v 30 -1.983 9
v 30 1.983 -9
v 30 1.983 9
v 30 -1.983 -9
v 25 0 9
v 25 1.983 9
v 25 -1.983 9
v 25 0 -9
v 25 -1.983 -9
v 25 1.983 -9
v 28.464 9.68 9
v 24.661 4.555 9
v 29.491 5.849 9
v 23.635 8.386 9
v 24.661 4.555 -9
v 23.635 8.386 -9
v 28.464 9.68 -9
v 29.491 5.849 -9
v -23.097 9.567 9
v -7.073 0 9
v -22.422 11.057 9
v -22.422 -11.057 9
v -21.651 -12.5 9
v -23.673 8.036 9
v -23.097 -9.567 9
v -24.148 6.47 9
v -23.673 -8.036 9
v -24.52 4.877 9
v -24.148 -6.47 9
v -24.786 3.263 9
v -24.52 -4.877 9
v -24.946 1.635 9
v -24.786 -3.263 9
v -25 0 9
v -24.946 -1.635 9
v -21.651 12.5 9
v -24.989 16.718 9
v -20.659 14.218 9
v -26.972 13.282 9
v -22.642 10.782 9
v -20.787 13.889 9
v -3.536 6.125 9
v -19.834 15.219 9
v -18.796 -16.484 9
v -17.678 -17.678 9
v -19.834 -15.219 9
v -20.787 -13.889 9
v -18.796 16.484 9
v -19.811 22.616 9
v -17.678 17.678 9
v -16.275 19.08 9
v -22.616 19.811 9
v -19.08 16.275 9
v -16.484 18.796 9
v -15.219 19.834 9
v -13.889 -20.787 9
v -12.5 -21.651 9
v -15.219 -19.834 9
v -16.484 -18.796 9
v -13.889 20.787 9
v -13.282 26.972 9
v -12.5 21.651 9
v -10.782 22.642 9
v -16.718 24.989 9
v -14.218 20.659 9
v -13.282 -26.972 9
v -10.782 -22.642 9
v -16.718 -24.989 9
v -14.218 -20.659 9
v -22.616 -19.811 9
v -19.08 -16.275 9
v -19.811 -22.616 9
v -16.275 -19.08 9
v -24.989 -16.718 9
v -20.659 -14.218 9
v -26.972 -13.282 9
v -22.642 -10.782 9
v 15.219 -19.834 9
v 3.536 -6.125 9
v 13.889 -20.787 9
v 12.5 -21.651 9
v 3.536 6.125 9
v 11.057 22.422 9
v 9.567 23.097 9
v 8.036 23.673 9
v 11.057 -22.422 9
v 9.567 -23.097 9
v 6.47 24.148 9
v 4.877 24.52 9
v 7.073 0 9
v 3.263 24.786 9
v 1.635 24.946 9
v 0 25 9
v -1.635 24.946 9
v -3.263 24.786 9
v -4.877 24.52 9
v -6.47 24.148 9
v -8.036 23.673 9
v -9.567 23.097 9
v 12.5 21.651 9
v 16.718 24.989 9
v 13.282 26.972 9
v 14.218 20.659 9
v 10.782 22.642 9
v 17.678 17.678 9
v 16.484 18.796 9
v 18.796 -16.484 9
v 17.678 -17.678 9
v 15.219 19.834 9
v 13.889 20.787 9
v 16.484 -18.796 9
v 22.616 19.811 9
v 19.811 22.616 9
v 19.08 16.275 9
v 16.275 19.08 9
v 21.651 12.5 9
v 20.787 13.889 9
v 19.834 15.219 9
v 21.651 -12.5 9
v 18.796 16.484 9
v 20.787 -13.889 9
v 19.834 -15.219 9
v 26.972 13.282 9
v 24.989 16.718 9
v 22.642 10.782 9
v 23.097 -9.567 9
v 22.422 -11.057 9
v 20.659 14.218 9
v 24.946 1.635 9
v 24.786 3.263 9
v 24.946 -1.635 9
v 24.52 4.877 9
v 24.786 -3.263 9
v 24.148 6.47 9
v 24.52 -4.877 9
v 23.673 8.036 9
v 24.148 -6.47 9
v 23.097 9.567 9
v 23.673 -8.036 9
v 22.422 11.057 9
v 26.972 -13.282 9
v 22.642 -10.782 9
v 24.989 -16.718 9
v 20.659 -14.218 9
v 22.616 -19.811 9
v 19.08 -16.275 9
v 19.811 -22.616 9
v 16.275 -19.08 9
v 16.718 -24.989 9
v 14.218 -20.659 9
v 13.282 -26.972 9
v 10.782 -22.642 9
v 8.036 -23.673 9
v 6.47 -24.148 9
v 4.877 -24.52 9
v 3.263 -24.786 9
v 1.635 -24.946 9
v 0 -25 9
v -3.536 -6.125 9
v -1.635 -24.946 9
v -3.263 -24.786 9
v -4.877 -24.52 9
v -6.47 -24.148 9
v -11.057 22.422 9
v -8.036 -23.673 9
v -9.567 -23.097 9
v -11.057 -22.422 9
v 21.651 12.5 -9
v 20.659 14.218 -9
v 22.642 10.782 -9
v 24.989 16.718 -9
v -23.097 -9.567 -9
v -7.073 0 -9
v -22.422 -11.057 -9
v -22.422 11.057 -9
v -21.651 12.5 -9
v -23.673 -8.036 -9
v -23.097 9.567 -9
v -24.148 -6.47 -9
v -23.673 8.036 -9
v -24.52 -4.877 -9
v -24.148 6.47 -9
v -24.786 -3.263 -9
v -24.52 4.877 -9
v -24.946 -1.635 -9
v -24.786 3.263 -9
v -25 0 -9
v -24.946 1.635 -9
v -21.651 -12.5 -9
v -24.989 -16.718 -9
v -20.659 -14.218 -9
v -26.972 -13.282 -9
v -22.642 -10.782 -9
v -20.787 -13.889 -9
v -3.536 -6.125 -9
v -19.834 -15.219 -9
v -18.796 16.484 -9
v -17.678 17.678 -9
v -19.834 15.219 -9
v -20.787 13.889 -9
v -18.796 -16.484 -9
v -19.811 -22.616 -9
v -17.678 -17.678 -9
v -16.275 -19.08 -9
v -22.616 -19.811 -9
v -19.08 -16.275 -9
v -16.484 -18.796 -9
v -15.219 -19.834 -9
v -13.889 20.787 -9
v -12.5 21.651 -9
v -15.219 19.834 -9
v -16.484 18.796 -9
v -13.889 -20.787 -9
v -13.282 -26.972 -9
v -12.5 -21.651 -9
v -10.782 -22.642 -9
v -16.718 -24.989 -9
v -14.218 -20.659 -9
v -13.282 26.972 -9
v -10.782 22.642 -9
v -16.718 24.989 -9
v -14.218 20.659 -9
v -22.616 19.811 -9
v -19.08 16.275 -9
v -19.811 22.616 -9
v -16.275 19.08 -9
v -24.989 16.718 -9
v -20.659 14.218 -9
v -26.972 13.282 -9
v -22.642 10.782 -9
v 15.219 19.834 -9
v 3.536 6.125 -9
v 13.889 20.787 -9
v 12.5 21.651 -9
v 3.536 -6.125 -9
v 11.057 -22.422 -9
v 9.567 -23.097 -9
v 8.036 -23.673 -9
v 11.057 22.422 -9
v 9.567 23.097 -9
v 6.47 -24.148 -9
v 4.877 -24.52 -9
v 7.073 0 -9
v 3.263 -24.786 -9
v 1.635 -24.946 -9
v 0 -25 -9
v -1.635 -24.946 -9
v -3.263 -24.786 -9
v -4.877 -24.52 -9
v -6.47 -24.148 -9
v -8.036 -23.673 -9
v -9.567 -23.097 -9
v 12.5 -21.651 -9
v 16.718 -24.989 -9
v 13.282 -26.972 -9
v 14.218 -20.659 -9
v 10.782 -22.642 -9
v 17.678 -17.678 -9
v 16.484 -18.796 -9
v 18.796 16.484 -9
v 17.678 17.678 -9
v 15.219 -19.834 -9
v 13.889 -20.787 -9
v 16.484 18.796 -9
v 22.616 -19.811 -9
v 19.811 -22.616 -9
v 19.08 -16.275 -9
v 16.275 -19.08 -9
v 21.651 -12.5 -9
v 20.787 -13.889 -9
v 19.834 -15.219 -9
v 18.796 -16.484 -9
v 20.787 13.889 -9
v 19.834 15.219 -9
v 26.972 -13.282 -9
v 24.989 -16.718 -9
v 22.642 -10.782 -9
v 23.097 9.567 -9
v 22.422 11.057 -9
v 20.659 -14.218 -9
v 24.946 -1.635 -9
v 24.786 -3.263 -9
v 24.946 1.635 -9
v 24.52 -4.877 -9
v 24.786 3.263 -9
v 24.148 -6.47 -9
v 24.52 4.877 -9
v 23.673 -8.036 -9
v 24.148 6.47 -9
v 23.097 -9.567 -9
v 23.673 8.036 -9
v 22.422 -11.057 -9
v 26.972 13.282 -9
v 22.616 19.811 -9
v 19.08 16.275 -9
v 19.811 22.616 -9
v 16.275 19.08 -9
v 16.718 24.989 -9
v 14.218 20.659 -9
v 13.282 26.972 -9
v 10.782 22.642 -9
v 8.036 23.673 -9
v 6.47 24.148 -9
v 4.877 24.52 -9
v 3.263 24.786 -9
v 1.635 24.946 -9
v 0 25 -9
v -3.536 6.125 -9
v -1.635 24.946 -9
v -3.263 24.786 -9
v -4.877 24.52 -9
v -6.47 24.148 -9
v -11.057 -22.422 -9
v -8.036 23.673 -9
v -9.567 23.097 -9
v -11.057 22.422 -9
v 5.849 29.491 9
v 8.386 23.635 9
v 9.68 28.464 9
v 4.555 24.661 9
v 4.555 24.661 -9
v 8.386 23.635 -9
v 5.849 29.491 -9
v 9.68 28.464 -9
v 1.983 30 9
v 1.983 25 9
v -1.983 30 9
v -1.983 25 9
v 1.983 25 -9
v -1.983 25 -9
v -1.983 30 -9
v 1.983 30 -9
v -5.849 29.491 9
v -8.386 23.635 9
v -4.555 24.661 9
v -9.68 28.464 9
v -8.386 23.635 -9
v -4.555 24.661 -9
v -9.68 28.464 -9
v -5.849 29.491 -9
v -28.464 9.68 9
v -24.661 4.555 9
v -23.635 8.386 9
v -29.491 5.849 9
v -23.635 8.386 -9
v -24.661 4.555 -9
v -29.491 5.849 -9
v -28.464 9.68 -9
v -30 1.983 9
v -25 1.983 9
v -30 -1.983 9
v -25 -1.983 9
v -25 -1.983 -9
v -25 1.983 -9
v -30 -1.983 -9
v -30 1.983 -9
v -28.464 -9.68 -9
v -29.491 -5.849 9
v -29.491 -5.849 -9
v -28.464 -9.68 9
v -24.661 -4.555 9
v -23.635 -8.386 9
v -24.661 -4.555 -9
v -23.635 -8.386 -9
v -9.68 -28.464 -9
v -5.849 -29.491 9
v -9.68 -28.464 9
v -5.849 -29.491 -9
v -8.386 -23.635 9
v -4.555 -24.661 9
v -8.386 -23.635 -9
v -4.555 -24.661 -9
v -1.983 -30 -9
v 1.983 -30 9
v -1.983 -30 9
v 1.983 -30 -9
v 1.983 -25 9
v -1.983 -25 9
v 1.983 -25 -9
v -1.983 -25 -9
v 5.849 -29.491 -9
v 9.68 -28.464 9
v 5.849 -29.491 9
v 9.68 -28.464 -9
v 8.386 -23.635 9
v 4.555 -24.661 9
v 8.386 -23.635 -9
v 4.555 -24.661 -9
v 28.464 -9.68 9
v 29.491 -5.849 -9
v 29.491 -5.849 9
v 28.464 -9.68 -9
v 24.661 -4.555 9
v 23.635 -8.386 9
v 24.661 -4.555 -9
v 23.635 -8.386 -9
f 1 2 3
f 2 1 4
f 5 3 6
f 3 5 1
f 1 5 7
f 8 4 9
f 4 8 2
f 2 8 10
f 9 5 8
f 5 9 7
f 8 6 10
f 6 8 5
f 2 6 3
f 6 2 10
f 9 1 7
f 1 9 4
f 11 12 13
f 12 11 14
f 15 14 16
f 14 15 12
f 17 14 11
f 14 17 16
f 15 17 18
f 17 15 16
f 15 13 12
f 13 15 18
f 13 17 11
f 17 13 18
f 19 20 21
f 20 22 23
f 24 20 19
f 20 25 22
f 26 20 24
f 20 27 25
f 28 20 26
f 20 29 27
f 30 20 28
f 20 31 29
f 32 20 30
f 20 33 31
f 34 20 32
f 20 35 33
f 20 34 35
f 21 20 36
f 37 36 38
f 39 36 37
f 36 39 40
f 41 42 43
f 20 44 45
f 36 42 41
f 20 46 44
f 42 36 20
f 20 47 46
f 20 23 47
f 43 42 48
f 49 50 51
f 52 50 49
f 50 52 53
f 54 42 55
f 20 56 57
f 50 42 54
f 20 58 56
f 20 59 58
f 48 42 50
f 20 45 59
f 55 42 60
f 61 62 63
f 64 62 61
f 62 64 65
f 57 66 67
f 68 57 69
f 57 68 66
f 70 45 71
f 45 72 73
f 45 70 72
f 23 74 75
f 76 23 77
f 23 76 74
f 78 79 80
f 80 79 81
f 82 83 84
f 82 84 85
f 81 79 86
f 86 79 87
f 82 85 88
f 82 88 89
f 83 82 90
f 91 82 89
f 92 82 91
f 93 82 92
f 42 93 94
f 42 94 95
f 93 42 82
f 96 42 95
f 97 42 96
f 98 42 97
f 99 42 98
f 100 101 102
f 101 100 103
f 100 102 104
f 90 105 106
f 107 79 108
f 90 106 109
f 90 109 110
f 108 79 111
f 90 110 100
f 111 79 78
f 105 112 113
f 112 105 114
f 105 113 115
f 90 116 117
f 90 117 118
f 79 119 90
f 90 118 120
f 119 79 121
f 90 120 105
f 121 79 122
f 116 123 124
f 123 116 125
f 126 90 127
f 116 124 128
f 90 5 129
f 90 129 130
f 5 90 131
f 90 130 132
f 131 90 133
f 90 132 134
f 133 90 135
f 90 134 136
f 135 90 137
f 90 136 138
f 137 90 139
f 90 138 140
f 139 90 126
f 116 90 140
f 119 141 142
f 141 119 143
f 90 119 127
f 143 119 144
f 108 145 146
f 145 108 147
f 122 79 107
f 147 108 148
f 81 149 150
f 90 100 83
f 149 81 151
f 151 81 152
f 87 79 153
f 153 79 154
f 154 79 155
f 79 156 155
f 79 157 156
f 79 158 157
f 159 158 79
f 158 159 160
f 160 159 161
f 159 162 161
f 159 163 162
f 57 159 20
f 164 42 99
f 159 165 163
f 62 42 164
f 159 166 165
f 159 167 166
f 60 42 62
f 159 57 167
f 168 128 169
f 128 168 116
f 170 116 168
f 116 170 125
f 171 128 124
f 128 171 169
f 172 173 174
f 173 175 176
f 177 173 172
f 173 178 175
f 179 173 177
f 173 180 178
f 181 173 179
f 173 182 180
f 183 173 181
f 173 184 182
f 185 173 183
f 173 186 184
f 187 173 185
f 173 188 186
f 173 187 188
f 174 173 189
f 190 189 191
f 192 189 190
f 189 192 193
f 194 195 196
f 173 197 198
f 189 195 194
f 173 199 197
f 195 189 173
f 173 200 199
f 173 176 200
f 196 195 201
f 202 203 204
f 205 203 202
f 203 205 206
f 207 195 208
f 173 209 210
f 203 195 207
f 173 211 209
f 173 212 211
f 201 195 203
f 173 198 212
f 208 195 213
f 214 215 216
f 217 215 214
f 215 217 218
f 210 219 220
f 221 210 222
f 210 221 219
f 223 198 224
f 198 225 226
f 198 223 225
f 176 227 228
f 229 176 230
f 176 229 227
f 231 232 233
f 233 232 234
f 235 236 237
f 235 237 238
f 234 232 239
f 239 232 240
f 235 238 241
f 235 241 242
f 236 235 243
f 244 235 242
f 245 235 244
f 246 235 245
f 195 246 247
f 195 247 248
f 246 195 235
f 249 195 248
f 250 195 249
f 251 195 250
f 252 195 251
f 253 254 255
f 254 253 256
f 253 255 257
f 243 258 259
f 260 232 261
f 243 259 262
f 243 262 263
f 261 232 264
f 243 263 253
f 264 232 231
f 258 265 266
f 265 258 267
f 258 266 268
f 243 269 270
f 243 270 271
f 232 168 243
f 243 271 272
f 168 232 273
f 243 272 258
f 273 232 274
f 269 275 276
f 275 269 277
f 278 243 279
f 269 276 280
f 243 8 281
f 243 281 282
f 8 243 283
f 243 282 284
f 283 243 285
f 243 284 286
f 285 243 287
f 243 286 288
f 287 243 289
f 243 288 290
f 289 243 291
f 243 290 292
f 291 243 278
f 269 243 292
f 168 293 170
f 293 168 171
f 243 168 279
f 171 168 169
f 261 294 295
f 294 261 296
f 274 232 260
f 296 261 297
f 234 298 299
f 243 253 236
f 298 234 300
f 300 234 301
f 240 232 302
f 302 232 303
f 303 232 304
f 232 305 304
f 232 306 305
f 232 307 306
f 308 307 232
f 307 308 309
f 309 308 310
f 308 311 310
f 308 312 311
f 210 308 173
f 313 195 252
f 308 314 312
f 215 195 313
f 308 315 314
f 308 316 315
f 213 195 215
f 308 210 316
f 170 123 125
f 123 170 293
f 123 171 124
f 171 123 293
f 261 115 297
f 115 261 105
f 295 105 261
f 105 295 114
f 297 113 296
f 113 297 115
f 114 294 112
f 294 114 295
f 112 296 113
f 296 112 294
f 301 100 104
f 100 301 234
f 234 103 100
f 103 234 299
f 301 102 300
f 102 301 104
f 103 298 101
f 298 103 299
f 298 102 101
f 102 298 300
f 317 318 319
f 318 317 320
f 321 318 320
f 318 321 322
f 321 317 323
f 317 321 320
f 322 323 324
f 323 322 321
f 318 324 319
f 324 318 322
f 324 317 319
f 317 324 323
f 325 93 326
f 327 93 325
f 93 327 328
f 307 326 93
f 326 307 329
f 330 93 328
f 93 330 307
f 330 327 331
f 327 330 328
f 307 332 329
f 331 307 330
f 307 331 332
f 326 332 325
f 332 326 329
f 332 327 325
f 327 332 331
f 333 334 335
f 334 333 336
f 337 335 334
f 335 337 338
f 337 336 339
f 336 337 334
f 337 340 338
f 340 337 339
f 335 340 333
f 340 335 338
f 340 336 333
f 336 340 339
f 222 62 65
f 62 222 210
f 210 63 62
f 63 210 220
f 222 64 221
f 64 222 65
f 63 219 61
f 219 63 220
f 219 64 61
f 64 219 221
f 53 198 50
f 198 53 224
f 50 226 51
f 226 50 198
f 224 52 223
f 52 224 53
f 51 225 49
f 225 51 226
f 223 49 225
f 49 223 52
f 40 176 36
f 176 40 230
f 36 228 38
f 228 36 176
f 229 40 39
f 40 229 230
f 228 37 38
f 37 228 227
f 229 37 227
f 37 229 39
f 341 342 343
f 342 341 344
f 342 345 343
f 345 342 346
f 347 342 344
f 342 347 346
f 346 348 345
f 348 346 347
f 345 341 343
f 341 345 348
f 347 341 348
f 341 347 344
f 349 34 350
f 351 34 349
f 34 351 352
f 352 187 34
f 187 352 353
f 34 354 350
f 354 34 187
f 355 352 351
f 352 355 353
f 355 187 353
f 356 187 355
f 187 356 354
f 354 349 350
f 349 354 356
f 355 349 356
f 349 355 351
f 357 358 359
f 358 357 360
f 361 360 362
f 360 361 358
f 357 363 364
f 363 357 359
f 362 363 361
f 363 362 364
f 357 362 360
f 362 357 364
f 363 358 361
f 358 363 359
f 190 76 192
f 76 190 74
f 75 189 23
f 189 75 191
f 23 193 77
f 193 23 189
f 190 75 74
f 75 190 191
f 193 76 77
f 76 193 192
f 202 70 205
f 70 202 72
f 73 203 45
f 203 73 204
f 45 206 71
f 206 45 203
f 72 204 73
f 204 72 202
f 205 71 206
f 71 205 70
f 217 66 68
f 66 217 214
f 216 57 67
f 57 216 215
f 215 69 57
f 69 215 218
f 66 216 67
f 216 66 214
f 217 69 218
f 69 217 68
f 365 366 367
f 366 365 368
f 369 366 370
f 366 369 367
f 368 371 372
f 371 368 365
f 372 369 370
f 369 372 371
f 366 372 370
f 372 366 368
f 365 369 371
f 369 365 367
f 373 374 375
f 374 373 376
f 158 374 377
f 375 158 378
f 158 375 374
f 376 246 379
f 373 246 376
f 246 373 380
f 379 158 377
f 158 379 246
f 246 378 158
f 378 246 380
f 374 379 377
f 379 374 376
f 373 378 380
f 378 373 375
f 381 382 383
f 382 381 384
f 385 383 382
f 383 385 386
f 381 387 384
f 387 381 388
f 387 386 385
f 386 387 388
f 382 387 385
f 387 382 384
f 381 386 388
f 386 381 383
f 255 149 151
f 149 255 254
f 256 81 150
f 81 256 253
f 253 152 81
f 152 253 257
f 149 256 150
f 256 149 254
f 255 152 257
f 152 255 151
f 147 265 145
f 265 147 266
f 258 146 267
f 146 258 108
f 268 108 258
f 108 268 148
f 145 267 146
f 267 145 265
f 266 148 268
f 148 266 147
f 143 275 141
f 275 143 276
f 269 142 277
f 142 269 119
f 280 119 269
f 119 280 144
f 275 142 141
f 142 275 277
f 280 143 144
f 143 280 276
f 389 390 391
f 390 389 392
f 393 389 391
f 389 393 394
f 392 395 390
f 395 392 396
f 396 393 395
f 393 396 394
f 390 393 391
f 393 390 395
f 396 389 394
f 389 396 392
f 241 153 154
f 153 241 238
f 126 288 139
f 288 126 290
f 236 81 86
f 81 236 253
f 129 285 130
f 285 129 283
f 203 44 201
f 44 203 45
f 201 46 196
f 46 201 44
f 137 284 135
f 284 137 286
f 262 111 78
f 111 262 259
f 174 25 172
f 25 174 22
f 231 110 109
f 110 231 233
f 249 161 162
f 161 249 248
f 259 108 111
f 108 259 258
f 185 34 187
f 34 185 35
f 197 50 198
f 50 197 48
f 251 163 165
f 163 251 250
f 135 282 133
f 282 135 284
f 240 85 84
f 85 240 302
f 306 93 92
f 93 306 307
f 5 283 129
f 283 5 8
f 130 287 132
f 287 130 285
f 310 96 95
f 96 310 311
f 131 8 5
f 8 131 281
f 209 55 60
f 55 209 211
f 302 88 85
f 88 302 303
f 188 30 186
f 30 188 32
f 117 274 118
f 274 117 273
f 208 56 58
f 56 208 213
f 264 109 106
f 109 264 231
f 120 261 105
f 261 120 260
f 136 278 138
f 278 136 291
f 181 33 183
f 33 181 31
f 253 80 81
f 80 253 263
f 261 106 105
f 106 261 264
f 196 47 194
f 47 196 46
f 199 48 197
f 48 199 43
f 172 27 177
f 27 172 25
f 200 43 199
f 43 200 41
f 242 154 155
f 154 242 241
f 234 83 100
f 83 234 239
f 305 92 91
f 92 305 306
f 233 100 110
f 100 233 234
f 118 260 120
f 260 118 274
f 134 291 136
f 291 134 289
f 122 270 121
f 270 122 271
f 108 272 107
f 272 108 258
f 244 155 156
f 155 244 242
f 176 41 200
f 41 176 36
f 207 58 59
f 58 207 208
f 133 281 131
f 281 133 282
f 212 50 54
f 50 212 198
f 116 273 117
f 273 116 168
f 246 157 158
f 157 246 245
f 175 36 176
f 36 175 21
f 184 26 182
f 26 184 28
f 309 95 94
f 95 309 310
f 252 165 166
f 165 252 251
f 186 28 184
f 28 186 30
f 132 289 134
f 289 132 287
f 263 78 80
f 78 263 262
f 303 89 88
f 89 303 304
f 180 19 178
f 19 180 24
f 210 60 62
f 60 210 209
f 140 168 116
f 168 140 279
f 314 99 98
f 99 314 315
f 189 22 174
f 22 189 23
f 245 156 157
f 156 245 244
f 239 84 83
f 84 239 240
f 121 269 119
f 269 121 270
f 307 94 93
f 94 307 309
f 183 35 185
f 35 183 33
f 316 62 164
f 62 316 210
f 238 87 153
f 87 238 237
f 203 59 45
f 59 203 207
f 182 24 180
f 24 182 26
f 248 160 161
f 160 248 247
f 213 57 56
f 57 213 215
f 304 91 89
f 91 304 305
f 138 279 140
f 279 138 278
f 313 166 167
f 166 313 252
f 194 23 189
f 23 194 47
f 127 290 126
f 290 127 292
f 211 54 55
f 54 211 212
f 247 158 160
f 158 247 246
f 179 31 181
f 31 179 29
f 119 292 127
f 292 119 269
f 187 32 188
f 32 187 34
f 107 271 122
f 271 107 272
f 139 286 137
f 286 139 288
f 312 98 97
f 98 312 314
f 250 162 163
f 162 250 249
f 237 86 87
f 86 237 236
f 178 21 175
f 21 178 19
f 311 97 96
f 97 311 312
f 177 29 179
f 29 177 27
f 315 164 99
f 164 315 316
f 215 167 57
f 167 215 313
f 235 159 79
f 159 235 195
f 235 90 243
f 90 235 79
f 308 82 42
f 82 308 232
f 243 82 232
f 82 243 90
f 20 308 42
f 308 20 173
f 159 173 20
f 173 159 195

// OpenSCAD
$fn=96;

gear_od = 60;
gear_thickness = 18;
body_od = 50;

tooth_count = 24;
tooth_radial = (gear_od - body_od)/2;
tooth_arc_factor = 0.55;

hex_flat = 12;
hex_clearance = 0.25;

module hex_prism(flat, h){
    r = flat / sqrt(3);
    cylinder(h=h, r=r, $fn=6, center=true);
}

module tooth(r_base, radial, h, ang_width){
    r_mid = r_base + radial/2;
    w = 2*r_mid*tan(ang_width/2);
    translate([r_base + radial/2, 0, 0])
        cube([radial, w, h], center=true);
}

module gear_body(){
    union(){
        cylinder(h=gear_thickness, d=body_od, center=true);
        for(i=[0:tooth_count-1]){
            rotate([0,0, i*360/tooth_count])
                tooth(body_od/2, tooth_radial, gear_thickness, (360/tooth_count)*tooth_arc_factor);
        }
    }
}

difference(){
    gear_body();
    hex_prism(hex_flat + hex_clearance, gear_thickness + 2);
}
